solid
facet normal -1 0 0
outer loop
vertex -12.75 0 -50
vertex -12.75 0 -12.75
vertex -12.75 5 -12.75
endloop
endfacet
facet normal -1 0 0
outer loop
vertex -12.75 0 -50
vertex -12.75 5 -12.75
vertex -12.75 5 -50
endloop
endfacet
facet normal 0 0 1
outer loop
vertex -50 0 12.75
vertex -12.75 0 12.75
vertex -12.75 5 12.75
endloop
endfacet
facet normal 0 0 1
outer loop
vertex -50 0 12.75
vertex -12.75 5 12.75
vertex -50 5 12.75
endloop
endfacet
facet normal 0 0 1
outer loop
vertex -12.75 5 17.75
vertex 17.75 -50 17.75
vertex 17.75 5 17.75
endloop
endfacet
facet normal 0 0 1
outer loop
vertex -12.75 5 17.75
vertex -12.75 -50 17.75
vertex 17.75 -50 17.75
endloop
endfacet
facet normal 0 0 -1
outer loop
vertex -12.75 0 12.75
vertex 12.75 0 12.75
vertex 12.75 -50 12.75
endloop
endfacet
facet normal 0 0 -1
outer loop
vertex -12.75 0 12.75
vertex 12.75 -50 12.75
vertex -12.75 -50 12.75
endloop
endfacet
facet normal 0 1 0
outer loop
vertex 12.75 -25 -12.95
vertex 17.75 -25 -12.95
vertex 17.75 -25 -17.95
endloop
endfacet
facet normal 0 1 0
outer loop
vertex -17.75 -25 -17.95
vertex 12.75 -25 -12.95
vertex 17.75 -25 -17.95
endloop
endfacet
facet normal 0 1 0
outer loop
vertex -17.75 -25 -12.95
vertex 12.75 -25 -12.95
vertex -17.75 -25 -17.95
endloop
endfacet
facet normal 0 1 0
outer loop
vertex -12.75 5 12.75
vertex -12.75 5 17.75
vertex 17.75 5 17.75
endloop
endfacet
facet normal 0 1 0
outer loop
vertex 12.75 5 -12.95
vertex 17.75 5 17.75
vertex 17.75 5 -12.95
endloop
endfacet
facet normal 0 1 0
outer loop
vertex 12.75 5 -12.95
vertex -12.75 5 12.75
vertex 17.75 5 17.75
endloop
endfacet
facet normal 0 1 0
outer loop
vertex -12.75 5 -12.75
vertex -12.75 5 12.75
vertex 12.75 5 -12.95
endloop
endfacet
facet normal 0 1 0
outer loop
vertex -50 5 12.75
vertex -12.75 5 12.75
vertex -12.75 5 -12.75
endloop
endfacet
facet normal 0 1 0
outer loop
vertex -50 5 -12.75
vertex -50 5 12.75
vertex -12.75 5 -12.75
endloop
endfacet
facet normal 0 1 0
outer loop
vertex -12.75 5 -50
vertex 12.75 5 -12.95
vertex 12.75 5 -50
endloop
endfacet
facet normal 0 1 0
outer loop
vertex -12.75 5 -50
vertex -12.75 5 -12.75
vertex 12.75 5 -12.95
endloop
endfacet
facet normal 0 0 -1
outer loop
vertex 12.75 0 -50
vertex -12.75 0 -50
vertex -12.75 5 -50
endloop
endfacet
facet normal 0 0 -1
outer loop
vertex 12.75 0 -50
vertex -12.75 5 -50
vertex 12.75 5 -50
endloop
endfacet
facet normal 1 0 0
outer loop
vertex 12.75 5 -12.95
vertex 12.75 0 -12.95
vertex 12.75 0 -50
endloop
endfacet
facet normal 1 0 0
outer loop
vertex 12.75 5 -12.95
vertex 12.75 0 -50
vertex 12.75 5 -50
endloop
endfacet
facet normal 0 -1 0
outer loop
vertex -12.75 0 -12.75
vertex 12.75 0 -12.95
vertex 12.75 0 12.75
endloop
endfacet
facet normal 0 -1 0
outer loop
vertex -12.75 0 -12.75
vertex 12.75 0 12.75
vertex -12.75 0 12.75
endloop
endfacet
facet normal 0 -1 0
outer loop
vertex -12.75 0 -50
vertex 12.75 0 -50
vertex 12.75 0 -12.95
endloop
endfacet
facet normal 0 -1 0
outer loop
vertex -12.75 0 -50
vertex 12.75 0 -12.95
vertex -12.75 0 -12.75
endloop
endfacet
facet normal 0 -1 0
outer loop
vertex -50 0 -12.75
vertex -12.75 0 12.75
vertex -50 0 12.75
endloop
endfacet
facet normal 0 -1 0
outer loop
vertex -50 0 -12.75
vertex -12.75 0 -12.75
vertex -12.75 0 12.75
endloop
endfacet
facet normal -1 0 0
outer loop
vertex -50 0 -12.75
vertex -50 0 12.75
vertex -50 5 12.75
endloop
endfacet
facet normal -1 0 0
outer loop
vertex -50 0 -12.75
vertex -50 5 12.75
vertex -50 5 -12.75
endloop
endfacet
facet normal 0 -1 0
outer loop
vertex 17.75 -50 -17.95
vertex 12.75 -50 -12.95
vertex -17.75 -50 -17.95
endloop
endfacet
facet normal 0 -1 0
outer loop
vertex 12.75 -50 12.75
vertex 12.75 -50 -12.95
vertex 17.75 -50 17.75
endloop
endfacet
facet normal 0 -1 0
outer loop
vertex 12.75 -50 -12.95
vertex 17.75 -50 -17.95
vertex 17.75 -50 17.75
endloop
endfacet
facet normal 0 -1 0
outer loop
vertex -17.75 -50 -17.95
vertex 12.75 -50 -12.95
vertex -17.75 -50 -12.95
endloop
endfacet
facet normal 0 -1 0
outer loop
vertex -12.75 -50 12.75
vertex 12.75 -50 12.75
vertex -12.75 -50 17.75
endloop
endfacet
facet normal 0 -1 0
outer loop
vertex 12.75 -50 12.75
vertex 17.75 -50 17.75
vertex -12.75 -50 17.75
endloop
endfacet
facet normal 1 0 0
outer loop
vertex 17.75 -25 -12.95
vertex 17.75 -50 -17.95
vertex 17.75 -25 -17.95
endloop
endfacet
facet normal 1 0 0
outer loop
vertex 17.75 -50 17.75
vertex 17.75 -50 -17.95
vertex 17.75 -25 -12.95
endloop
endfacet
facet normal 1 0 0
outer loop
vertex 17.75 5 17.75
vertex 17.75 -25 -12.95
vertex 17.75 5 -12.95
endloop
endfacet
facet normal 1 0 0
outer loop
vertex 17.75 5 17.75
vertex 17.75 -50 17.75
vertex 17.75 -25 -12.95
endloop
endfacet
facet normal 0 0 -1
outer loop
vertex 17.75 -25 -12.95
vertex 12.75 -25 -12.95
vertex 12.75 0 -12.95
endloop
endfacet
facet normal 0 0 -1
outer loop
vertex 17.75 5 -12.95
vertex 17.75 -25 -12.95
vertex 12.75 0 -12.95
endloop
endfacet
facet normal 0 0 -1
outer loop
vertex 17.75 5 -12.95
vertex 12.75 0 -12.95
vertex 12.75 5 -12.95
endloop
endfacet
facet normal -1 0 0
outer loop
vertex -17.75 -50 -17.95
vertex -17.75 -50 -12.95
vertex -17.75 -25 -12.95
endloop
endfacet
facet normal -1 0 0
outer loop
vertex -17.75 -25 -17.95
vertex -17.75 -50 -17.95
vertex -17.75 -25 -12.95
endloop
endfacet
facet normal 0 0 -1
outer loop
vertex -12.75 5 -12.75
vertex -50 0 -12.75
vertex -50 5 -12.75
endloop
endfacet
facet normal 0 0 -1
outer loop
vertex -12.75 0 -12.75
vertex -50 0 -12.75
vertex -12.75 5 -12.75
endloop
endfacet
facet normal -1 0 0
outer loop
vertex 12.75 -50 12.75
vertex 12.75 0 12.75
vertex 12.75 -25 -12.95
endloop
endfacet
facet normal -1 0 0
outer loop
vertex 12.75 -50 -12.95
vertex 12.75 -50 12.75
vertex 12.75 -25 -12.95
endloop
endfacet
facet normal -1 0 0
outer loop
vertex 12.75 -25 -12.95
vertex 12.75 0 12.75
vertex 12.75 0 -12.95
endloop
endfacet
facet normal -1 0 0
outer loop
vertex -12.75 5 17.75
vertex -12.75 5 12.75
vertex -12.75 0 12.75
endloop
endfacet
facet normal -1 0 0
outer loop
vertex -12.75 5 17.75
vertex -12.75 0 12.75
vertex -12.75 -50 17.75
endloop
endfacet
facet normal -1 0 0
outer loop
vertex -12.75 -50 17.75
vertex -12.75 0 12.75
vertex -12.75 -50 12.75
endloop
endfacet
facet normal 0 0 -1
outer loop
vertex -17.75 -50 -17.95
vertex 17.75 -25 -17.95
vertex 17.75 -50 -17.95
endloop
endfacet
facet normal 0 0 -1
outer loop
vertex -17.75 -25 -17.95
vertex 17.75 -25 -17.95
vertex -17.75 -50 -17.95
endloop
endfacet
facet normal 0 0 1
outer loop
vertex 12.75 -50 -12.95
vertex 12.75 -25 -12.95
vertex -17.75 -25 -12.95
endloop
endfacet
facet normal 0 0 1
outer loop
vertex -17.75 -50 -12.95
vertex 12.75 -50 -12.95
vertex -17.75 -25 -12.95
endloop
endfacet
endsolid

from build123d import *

# Parameters (mm, degrees)
BOSS_EXTRUDE1_DEPTH = 5
BOSS_EXTRUDE2_DEPTH = 5
SKETCH4_W           = 30.7
SKETCH4_H           = 55
BOSS_EXTRUDE3_DEPTH = 5
SKETCH5_W           = 35.5
SKETCH5_H           = 25
BOSS_EXTRUDE4_DEPTH = 5


with BuildPart() as part:
    # Sketch2 → Boss-Extrude1 (new body)
    with BuildSketch(Plane(origin=(0, 0, 0), x_dir=(1, 0, 0), z_dir=(0, 1, 0))):
        Polygon((-12.75, 12.75), (-12.75, 50), (12.75, 50), (12.75, -12.75), (-50, -12.75), (-50, 12.75), align=None)
    extrude(amount=BOSS_EXTRUDE1_DEPTH)

    # Sketch3 → Boss-Extrude2 (add)
    with BuildSketch(Plane.XY.offset(12.75)):
        Polygon((12.75, 0), (12.75, -50), (-12.75, -50), (-12.75, 0), (-12.75, 5), (12.75, 5), align=None)
    extrude(amount=BOSS_EXTRUDE2_DEPTH)

    # Sketch4 → Boss-Extrude3 (add)
    with BuildSketch(Plane(origin=(12.75, 0, 0), x_dir=(0, 0, -1), z_dir=(1, 0, 0))):
        with Locations((-2.4, -22.5)):
            Rectangle(SKETCH4_W, SKETCH4_H)
    extrude(amount=BOSS_EXTRUDE3_DEPTH)

    # Sketch5 → Boss-Extrude4 (add)
    with BuildSketch(Plane(origin=(0, 0, -12.95), x_dir=(-1, 0, 0), z_dir=(0, 0, -1))):
        with Locations((0, -37.5)):
            Rectangle(SKETCH5_W, SKETCH5_H)
    extrude(amount=BOSS_EXTRUDE4_DEPTH)


solid = part.part
